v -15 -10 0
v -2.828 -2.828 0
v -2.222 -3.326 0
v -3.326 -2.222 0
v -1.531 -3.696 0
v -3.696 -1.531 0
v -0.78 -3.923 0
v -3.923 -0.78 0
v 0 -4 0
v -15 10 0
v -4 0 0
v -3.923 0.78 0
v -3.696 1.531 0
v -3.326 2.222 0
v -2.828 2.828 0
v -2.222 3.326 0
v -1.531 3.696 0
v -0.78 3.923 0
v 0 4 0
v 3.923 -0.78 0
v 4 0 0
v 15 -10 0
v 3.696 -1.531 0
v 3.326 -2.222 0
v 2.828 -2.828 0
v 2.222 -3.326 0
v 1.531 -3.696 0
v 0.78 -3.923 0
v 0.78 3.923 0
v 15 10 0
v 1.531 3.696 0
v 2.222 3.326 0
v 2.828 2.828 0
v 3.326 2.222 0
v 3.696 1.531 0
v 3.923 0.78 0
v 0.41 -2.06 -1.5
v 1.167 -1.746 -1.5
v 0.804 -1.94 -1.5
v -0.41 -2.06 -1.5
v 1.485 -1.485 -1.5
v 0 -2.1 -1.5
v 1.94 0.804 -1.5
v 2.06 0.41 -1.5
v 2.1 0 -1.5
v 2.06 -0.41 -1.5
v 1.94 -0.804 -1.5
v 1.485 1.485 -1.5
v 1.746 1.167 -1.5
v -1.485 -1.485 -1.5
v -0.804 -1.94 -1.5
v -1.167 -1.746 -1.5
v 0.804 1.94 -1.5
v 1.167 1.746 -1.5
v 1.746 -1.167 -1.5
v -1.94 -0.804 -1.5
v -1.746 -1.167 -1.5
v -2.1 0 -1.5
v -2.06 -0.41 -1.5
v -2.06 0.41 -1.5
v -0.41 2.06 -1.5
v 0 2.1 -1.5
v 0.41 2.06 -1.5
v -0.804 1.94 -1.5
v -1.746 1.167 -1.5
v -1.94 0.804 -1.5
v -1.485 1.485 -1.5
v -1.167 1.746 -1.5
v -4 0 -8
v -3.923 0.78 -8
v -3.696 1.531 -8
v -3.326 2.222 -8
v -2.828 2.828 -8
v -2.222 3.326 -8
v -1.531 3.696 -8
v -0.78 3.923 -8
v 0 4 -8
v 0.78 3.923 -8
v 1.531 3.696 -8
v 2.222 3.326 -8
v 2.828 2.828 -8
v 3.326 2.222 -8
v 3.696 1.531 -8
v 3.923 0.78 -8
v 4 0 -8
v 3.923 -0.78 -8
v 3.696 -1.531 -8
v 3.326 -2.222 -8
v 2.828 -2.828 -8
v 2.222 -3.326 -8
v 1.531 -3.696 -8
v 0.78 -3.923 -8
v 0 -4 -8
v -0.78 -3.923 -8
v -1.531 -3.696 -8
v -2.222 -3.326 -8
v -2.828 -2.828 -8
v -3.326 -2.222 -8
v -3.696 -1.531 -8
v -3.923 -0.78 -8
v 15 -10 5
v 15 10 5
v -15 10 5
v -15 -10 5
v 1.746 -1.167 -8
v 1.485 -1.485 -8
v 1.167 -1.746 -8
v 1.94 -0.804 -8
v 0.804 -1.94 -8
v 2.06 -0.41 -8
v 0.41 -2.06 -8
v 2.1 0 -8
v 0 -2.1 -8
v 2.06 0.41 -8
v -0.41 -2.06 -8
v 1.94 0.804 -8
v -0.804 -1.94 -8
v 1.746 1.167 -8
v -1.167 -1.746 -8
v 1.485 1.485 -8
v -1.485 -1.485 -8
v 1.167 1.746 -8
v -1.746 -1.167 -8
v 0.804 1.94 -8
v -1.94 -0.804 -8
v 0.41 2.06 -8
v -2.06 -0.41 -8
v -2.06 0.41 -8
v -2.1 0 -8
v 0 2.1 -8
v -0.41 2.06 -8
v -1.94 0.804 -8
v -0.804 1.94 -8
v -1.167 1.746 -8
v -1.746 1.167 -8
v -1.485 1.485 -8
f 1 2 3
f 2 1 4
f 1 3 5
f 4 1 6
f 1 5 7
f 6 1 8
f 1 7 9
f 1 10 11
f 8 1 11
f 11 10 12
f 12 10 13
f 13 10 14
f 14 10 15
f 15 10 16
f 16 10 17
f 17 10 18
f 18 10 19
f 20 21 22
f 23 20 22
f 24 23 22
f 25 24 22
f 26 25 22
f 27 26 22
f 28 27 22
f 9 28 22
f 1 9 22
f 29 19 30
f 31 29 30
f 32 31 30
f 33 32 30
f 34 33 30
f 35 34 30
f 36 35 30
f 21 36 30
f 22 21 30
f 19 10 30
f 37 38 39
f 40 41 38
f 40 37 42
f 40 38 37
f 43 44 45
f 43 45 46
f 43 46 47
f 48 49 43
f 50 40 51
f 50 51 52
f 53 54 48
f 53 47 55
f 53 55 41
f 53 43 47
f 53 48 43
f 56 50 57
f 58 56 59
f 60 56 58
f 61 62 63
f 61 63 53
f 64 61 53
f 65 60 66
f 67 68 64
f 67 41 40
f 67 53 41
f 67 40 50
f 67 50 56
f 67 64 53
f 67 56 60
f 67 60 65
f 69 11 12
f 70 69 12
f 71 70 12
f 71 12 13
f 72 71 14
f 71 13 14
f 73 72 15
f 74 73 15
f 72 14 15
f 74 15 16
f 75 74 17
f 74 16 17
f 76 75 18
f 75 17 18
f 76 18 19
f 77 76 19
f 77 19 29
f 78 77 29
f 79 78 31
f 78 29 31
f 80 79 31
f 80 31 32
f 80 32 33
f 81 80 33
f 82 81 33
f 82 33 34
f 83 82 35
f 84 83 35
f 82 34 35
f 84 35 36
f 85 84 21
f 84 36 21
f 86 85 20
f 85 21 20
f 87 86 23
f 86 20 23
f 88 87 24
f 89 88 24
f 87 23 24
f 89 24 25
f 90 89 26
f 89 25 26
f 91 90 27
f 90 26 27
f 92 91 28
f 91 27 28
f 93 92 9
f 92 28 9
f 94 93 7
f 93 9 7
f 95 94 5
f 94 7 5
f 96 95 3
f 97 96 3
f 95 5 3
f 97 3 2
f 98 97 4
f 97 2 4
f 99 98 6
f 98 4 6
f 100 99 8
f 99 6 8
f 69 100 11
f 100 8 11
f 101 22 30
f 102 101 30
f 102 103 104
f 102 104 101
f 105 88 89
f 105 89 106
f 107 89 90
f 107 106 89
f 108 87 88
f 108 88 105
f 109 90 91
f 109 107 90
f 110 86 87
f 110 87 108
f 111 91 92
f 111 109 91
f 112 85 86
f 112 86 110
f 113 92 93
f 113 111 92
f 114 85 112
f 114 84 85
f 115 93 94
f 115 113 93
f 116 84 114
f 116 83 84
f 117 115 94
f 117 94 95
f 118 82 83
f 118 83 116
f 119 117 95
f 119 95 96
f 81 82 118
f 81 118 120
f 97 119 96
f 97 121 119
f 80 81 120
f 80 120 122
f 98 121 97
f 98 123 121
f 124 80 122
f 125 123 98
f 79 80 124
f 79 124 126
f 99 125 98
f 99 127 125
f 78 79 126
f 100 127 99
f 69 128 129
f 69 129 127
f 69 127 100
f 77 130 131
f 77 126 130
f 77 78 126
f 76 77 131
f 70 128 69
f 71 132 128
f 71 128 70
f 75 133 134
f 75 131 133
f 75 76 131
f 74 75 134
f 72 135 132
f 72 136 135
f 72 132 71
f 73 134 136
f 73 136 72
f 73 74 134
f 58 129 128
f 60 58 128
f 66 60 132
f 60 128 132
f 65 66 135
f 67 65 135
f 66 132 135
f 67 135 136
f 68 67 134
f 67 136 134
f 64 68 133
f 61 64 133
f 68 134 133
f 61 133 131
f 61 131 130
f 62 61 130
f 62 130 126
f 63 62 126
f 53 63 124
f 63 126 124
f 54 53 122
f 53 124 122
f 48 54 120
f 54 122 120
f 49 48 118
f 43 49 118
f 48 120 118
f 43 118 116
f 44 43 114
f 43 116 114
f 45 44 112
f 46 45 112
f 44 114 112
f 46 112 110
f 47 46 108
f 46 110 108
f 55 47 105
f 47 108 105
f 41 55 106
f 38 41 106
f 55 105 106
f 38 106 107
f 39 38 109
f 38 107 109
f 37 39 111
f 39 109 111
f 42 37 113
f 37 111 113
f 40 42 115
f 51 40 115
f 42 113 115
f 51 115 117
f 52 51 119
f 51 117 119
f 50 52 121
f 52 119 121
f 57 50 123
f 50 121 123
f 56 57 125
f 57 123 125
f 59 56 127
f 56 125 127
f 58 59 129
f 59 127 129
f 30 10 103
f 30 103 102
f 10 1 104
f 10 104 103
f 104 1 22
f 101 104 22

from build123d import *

# Parameters (mm, degrees)
CROQUIS1_W              = 30
CROQUIS1_H              = 20
SALIENTE_EXTRUIR1_DEPTH = 5
CROQUIS2_R              = 4
SALIENTE_EXTRUIR3_DEPTH = 8
CROQUIS3_R              = 2.1
CORTAR_EXTRUIR1_DEPTH   = 6.5


with BuildPart() as part:
    # Croquis1 → Saliente-Extruir1 (new body)
    with BuildSketch(Plane.XY):
        Rectangle(CROQUIS1_W, CROQUIS1_H)
    extrude(amount=SALIENTE_EXTRUIR1_DEPTH)

    # Croquis2 → Saliente-Extruir3 (add)
    with BuildSketch(Plane(origin=(0, 0, 0), x_dir=(-1, 0, 0), z_dir=(0, 0, -1))):
        Circle(CROQUIS2_R)
    extrude(amount=SALIENTE_EXTRUIR3_DEPTH)

    # Croquis3 → Cortar-Extruir1 (cut)
    with BuildSketch(Plane(origin=(0, 0, -8), x_dir=(-1, 0, 0), z_dir=(0, 0, -1))):
        Circle(CROQUIS3_R)
    extrude(amount=-CORTAR_EXTRUIR1_DEPTH, mode=Mode.SUBTRACT)


solid = part.part
